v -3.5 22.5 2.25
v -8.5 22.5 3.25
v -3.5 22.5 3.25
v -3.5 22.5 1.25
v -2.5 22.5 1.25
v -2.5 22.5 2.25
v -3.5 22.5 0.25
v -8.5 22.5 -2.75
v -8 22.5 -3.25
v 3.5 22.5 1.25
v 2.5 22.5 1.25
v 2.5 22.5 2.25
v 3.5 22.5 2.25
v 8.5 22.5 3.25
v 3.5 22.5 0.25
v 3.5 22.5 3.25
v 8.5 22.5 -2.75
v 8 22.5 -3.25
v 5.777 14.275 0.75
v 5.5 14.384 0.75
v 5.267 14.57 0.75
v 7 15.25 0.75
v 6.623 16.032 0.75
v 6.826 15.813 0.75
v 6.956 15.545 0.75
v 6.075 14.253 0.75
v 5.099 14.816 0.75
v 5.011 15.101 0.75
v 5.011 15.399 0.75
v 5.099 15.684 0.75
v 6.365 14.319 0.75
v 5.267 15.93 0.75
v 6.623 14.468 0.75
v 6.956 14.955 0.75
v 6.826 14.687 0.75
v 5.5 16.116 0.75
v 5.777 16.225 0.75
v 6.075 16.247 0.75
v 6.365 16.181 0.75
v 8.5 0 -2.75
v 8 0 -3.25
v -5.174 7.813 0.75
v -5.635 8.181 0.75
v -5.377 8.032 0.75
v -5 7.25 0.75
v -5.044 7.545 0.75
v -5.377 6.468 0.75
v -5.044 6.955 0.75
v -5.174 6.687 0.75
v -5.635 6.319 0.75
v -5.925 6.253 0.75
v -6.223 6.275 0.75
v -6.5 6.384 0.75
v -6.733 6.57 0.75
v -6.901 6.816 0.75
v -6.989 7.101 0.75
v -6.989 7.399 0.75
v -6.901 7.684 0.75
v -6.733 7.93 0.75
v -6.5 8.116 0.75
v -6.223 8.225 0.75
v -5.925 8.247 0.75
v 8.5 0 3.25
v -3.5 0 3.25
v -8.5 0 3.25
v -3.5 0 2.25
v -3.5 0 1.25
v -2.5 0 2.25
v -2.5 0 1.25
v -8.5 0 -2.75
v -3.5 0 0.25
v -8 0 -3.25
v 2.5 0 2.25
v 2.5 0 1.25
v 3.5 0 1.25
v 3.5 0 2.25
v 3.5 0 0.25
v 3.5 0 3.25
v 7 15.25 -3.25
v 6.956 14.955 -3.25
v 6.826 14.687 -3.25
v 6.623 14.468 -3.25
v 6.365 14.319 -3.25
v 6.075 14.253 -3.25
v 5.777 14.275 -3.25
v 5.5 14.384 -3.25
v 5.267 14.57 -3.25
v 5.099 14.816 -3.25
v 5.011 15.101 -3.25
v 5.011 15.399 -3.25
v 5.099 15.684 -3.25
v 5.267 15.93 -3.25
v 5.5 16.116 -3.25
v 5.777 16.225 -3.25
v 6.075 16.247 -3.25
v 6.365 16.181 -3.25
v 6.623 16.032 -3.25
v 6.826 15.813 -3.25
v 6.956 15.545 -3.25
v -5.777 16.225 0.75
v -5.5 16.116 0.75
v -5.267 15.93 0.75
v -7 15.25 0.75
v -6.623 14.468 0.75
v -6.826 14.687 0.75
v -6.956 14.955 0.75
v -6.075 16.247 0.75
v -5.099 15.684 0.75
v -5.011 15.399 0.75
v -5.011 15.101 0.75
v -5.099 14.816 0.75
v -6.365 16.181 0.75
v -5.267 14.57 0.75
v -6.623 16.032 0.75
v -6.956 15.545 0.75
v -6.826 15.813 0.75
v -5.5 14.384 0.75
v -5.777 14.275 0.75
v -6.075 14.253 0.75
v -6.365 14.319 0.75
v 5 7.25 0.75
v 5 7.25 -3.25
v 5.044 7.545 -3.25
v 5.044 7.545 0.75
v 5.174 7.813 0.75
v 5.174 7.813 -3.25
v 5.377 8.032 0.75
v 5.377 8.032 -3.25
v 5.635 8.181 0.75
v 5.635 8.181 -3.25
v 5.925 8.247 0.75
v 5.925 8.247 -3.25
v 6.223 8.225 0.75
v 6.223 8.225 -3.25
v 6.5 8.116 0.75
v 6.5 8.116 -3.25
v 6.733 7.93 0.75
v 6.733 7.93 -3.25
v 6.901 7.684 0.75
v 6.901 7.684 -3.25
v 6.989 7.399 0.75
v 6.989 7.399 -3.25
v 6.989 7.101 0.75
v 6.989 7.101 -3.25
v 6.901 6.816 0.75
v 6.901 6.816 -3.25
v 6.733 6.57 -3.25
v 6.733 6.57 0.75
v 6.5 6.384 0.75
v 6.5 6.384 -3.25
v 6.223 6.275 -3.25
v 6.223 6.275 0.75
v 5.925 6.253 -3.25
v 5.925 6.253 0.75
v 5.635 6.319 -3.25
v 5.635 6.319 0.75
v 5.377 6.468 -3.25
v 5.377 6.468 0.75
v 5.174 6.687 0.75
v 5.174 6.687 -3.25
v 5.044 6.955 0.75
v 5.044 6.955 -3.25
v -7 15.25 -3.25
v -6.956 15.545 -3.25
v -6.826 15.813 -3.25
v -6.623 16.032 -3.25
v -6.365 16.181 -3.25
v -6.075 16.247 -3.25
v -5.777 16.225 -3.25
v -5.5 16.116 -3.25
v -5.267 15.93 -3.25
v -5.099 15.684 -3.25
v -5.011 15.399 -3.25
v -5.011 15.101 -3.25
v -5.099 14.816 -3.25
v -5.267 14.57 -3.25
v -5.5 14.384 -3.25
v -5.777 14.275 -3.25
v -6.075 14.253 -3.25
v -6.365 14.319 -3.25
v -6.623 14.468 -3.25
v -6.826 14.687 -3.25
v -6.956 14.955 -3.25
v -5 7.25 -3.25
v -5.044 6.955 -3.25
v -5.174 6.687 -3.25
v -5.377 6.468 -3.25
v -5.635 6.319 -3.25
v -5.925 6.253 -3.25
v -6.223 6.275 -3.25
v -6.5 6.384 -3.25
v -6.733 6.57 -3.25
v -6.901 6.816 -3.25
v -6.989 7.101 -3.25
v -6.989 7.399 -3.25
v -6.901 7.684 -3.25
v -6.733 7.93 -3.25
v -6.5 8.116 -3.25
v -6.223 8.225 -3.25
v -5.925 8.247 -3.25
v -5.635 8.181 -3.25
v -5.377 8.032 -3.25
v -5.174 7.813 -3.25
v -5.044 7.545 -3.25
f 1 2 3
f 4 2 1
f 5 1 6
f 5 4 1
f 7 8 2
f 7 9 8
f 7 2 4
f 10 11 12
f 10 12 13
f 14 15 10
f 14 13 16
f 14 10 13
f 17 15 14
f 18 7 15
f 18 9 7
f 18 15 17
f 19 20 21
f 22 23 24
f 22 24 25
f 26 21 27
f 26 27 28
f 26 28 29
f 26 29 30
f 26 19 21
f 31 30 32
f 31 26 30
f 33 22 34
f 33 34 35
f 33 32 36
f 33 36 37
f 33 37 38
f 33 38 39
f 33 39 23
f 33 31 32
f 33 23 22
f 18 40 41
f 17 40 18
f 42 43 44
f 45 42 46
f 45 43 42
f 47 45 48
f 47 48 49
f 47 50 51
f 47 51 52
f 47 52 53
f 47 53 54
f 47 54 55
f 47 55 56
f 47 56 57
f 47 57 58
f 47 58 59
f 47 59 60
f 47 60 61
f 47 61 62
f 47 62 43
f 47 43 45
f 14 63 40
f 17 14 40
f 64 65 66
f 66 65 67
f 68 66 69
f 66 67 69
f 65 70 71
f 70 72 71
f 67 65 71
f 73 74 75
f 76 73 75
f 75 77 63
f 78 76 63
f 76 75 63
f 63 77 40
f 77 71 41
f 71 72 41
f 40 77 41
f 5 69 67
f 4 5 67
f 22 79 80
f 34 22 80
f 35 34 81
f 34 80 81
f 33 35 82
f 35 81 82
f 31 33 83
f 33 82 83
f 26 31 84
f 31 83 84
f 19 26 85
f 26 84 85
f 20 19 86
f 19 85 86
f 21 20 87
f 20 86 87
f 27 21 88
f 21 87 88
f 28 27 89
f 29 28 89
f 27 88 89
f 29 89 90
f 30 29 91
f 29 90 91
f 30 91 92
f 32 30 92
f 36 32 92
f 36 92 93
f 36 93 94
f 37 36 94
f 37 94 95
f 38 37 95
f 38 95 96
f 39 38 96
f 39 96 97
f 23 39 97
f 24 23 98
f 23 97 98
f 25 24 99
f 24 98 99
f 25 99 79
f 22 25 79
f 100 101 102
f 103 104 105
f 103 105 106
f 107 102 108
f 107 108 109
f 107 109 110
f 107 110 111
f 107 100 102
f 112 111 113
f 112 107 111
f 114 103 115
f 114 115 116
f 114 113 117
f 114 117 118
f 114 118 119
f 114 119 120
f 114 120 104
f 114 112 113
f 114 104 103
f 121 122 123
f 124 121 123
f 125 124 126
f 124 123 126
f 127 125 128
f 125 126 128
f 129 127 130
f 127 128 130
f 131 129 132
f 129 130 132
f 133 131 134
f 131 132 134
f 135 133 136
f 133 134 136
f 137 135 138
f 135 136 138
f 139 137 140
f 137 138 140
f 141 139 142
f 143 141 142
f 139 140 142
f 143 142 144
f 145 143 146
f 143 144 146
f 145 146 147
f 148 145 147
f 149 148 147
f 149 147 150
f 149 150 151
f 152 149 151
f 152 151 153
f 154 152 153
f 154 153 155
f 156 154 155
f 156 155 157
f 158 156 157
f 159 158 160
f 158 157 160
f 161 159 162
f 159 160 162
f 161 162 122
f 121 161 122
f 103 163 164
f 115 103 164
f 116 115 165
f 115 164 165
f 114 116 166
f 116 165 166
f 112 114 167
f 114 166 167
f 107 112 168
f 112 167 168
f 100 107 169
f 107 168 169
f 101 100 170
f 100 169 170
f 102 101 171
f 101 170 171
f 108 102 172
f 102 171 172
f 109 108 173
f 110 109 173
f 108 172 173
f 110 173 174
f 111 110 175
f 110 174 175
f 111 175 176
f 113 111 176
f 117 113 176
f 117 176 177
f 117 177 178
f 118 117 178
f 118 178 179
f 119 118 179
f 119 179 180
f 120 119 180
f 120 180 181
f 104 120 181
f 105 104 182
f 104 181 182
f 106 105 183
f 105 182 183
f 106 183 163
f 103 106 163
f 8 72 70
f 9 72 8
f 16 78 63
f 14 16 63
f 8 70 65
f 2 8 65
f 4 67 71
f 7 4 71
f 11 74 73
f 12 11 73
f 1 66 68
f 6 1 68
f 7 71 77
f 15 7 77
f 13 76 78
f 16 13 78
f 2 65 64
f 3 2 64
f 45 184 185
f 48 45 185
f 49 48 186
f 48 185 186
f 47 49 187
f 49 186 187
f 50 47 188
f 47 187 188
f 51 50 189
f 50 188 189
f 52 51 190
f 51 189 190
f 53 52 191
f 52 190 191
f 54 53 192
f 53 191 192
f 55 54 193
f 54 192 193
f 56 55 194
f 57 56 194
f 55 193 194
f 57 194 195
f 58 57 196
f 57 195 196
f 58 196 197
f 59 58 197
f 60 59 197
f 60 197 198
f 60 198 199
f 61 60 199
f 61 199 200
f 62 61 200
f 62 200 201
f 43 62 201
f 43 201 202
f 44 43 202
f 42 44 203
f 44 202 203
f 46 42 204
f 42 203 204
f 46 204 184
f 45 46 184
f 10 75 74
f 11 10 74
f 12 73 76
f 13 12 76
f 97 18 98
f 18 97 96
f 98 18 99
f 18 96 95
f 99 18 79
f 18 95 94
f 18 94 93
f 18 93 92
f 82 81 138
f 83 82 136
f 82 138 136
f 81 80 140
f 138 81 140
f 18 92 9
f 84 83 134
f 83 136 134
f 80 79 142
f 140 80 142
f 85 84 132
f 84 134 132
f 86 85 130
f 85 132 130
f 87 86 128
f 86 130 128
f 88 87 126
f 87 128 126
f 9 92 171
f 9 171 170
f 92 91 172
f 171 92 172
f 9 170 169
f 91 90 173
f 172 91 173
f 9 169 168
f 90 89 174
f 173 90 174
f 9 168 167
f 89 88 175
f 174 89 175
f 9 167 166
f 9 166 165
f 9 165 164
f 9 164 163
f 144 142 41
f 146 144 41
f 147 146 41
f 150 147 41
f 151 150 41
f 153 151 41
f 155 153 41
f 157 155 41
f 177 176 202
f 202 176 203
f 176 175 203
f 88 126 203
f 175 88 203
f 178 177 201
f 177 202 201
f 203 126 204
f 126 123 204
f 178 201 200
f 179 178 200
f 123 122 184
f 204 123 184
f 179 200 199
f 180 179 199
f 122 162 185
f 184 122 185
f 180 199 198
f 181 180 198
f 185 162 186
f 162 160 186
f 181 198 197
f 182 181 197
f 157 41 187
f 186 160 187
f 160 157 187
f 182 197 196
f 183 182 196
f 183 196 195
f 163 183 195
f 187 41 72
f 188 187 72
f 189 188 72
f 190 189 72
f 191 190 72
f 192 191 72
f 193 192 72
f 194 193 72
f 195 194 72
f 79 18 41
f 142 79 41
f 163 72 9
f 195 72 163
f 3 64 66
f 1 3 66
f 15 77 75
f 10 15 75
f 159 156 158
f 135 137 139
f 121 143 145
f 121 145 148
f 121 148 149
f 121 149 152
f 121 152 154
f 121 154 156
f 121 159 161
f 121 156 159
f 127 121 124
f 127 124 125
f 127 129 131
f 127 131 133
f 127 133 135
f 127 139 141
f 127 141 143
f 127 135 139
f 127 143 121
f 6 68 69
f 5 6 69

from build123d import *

# Parameters (mm, degrees)
EXTRUDE_1_DEPTH     = 22.5
SKETCH_2_R          = 1
CUT_EXTRUDE_1_DEPTH = 4
CHAMFER_1_SIZE      = 0.5


with BuildPart() as part:
    # 草图1 → 凸台-拉伸1 (new body)
    with BuildSketch(Plane(origin=(0, 0, 0), x_dir=(1, 0, 0), z_dir=(0, 1, 0))):
        Polygon((-8.5, 3.25), (-8.5, -3.25), (-3.5, -3.25), (-3.5, -2.25), (-2.5, -2.25), (-2.5, -1.25), (-3.5, -1.25), (-3.5, -0.25), (3.5, -0.25), (3.5, -1.25), (2.5, -1.25), (2.5, -2.25), (3.5, -2.25), (3.5, -3.25), (8.5, -3.25), (8.5, 3.25), align=None)
    extrude(amount=EXTRUDE_1_DEPTH)

    # 草图2 → 切除-拉伸1 (cut)
    with BuildSketch(Plane(origin=(0, 0, -3.25), x_dir=(-1, 0, 0), z_dir=(0, 0, -1))):
        with Locations((6, 15.25)):
            Circle(SKETCH_2_R)
        with Locations(Location((6, 7.25, 0), (0, 0, 180))):
            Circle(SKETCH_2_R)
        with Locations((-6, 7.25)):
            Circle(SKETCH_2_R)
        with Locations(Location((-6, 15.25, 0), (0, 0, 180))):
            Circle(SKETCH_2_R)
    extrude(amount=-CUT_EXTRUDE_1_DEPTH, mode=Mode.SUBTRACT)

    # 倒角1
    chamfer_1_edges = [part.edges().sort_by_distance(p)[0] for p in [
        (-8.5, 11.25, -3.25),
        (8.5, 11.25, -3.25),
    ]]
    chamfer(chamfer_1_edges, length=CHAMFER_1_SIZE)


solid = part.part
